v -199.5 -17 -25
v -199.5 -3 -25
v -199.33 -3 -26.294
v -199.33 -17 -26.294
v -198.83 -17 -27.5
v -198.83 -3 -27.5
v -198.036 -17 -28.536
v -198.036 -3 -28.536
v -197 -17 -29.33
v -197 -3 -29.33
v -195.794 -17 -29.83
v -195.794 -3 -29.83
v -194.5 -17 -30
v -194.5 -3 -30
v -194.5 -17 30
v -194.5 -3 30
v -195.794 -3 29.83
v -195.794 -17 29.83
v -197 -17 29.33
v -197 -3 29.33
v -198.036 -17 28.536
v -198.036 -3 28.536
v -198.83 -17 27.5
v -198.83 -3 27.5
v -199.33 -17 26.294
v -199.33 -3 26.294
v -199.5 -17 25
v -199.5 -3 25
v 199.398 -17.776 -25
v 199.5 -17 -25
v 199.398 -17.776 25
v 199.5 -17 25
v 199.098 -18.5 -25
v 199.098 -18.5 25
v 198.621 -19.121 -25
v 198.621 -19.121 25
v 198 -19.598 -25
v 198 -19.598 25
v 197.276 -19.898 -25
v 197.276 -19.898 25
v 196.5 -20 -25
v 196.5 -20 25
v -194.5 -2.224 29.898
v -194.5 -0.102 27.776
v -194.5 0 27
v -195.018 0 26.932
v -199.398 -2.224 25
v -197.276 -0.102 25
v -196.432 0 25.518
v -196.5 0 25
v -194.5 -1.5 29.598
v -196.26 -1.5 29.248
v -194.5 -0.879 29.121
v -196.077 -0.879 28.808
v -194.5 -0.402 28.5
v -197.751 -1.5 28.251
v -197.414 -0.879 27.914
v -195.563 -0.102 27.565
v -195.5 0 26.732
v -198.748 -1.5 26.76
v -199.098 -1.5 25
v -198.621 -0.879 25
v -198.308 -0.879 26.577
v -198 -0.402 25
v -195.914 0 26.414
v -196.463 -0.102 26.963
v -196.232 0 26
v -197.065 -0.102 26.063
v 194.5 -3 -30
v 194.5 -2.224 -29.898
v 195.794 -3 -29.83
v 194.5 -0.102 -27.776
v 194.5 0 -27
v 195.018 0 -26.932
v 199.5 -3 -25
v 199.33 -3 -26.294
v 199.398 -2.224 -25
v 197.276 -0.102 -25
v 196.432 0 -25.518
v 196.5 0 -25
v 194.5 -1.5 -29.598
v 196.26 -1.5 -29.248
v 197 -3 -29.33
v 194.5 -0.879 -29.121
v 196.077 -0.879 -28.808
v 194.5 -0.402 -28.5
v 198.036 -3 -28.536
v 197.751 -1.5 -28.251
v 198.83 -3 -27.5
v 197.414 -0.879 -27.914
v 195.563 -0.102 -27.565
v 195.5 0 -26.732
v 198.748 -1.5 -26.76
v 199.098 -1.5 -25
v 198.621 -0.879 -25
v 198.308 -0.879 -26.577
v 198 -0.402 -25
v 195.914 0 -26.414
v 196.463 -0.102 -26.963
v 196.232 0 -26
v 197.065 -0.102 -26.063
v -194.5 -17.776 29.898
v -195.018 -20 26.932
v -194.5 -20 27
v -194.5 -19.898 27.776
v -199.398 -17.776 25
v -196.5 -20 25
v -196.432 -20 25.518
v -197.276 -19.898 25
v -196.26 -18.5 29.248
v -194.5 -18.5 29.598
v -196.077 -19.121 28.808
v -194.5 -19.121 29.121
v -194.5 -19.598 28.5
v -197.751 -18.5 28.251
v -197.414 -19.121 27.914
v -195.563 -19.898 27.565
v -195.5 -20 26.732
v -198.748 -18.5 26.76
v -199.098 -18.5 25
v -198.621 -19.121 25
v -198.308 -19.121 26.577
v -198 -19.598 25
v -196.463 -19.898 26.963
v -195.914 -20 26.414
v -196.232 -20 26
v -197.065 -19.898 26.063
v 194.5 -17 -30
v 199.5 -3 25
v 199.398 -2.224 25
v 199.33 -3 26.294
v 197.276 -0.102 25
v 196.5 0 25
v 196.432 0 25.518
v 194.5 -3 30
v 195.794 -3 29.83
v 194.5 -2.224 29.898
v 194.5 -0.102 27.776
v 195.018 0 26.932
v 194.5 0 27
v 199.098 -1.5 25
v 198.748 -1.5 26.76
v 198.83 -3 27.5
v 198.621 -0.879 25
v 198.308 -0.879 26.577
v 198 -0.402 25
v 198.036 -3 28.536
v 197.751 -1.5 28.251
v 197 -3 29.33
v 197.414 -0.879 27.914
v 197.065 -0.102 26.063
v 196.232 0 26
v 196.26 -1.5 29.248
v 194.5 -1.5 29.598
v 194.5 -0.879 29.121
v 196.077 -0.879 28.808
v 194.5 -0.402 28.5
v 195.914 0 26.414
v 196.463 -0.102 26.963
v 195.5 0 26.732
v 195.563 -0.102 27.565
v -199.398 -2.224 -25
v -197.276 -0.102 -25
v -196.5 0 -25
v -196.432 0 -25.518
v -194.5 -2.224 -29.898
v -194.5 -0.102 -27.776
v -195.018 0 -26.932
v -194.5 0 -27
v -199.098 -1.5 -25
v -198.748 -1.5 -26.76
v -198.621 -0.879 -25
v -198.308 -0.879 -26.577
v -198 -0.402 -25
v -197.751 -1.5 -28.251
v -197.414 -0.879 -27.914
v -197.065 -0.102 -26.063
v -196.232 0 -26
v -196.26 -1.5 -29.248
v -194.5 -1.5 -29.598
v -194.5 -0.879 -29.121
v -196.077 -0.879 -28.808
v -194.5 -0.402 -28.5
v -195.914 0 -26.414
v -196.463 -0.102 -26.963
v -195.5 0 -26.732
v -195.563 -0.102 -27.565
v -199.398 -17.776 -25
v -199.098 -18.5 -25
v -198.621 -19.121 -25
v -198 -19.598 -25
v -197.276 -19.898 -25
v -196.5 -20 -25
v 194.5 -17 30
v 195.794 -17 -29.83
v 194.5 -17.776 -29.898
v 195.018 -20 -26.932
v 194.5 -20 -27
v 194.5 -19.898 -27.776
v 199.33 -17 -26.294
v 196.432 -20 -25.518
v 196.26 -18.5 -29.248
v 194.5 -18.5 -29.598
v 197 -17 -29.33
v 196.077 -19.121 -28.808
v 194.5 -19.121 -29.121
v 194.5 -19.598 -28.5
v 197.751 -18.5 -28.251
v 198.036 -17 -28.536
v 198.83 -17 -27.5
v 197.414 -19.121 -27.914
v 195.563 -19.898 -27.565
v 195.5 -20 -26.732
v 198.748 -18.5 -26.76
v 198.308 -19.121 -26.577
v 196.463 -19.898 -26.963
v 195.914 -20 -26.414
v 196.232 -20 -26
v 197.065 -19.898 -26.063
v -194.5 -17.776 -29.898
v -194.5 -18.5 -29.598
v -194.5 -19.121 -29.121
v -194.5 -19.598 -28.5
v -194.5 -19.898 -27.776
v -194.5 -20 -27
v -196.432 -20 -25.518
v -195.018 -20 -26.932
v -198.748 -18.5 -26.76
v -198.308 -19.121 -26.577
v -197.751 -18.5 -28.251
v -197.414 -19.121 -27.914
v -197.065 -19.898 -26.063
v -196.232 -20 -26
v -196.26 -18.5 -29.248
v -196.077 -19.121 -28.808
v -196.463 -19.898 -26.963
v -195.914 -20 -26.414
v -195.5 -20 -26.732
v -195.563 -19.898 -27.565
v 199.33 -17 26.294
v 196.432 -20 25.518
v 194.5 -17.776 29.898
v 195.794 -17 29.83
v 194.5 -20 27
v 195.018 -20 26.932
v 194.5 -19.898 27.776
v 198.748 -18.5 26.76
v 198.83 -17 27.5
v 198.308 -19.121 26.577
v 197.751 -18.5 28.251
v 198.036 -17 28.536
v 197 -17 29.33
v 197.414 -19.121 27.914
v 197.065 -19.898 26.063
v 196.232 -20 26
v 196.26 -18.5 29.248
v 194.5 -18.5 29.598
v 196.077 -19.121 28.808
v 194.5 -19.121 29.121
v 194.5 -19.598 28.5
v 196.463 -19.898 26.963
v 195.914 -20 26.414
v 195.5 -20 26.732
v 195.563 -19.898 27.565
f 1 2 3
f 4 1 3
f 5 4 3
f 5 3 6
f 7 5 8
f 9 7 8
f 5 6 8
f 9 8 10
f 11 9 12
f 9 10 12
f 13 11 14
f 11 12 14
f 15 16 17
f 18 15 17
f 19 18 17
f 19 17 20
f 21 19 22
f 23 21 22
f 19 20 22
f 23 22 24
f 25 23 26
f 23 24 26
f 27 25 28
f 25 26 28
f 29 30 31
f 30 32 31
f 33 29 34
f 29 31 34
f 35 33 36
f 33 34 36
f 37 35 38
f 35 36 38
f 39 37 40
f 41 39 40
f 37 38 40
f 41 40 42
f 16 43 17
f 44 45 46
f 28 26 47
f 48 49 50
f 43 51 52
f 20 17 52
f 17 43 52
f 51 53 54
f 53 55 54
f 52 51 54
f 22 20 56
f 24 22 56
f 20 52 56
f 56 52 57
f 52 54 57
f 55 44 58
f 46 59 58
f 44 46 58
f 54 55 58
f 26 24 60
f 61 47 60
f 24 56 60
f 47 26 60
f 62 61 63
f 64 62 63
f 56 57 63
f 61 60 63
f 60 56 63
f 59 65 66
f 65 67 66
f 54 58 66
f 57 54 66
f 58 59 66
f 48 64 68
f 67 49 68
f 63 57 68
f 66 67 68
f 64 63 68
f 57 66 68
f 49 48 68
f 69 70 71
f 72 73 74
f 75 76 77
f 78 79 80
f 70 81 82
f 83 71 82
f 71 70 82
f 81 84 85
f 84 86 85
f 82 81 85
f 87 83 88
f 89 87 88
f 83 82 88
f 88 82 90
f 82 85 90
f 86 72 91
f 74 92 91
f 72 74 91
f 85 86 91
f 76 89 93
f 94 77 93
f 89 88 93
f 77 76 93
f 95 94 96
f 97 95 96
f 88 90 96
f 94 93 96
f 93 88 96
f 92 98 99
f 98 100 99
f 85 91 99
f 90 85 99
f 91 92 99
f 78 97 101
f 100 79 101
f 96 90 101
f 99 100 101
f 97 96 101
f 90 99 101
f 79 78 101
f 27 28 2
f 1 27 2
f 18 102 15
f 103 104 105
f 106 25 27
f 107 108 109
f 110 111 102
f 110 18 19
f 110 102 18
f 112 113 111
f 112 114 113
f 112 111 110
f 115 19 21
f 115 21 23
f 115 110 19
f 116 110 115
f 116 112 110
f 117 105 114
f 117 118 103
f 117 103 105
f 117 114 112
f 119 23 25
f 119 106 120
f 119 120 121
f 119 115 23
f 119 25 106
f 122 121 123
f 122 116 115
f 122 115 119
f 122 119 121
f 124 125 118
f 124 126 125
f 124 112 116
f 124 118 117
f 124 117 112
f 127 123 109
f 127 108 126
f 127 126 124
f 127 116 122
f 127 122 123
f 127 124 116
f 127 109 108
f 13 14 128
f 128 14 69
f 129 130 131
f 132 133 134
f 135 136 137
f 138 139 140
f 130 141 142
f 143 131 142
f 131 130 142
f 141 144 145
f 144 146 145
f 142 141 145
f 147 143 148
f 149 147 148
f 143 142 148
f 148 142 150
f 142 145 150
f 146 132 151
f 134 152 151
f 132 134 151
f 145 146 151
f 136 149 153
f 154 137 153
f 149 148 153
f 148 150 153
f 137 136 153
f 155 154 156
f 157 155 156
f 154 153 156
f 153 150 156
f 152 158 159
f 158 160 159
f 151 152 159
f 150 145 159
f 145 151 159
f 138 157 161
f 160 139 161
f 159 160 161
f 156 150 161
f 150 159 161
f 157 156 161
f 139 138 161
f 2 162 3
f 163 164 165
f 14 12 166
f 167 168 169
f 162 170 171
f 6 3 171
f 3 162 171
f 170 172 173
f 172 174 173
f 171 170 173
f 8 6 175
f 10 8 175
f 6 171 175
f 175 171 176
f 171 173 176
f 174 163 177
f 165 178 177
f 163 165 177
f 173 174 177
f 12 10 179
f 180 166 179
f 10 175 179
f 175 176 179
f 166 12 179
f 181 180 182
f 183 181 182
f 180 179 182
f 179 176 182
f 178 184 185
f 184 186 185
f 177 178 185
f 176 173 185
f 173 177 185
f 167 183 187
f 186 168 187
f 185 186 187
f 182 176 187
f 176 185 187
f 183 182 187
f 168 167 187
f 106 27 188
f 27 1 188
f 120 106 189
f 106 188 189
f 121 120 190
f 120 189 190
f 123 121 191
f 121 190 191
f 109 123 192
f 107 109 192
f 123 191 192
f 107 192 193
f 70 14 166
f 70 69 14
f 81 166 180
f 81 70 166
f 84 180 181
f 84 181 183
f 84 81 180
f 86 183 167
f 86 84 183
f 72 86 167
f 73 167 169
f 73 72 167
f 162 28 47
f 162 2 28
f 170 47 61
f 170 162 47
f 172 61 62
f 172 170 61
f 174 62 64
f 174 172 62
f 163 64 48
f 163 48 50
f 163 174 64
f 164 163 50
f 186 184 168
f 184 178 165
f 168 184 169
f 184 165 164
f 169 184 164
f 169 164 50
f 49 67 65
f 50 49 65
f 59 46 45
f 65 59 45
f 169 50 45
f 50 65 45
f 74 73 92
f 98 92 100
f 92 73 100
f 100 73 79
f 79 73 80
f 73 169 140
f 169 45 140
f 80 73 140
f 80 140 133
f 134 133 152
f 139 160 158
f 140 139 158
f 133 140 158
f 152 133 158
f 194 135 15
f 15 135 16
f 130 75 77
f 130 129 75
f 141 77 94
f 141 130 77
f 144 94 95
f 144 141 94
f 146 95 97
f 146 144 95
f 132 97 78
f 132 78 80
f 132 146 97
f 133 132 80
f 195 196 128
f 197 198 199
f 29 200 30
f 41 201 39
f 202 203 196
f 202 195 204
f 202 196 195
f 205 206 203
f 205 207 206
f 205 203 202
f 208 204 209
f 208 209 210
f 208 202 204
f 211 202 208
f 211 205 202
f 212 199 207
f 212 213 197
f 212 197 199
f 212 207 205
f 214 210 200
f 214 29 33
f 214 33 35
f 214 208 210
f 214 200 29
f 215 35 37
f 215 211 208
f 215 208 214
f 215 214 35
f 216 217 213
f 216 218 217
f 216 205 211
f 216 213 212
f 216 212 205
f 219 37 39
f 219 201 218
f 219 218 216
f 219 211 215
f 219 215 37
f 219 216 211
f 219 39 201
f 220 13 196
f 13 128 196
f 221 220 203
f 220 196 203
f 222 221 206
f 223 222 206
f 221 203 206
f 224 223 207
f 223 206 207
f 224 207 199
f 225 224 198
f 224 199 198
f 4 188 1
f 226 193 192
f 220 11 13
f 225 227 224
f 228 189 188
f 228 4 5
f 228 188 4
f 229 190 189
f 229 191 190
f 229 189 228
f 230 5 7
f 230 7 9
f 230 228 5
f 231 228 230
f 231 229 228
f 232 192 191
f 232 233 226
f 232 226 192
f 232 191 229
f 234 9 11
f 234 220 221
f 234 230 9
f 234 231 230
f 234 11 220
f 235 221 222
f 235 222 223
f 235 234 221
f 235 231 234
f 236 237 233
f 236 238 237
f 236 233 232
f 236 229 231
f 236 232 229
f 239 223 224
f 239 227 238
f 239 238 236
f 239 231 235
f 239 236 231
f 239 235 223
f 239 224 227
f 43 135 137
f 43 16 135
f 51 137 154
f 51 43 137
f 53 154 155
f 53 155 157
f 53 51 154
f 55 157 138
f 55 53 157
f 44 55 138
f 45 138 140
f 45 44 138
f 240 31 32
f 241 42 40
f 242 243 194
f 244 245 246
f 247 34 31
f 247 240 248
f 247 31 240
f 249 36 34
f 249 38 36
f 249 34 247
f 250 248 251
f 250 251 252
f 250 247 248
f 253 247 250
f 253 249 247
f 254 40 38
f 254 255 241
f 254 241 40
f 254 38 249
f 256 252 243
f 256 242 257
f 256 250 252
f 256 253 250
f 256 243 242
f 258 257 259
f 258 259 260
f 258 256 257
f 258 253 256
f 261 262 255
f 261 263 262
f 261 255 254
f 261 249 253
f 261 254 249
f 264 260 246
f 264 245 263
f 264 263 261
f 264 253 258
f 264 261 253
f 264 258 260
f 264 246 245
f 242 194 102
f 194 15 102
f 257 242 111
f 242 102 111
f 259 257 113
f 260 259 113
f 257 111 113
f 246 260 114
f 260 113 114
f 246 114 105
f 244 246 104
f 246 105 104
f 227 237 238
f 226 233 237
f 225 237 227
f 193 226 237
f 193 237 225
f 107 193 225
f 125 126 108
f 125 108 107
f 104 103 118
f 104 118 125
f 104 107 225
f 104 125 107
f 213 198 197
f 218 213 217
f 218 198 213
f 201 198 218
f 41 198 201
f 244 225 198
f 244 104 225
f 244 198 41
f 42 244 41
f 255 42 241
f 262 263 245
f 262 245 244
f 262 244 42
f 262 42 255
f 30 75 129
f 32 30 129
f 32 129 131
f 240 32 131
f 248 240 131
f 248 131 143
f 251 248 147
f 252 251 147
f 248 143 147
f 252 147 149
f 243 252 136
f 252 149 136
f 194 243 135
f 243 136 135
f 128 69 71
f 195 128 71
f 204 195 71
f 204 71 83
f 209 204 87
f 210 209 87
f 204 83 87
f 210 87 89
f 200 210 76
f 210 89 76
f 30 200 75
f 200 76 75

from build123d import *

# Parameters (mm, degrees)
F1_DEPTH = 20
F2_R     = 3


with BuildPart() as f1:
    # F0 (on Front) → F1 (new body)
    with BuildSketch(Plane.XZ):
        with BuildLine():
            Line((-194.5, -30), (194.5, -30))
            ThreePointArc((194.5, -30), (198.035534, -28.535534), (199.5, -25))
            Line((199.5, -25), (199.5, 25))
            ThreePointArc((199.5, 25), (198.035534, 28.535534), (194.5, 30))
            Line((194.5, 30), (-194.5, 30))
            ThreePointArc((-194.5, 30), (-198.035534, 28.535534), (-199.5, 25))
            Line((-199.5, 25), (-199.5, -25))
            ThreePointArc((-199.5, -25), (-198.035534, -28.535534), (-194.5, -30))
        make_face()
    extrude(amount=F1_DEPTH)

    # F2
    f2_edges = [f1.edges().sort_by_distance(p)[0] for p in [
        (0, -20, -30),
        (198.035534, -20, -28.535534),
        (199.5, -20, 0),
        (198.035534, -20, 28.535534),
        (0, -20, 30),
        (-198.035534, -20, 28.535534),
        (-199.5, -20, 0),
        (-198.035534, -20, -28.535534),
        (0, 0, -30),
        (198.035534, 0, -28.535534),
        (199.5, 0, 0),
        (198.035534, 0, 28.535534),
        (0, 0, 30),
        (-198.035534, 0, 28.535534),
        (-199.5, 0, 0),
        (-198.035534, 0, -28.535534),
    ]]
    fillet(f2_edges, radius=F2_R)


solid = f1.part
